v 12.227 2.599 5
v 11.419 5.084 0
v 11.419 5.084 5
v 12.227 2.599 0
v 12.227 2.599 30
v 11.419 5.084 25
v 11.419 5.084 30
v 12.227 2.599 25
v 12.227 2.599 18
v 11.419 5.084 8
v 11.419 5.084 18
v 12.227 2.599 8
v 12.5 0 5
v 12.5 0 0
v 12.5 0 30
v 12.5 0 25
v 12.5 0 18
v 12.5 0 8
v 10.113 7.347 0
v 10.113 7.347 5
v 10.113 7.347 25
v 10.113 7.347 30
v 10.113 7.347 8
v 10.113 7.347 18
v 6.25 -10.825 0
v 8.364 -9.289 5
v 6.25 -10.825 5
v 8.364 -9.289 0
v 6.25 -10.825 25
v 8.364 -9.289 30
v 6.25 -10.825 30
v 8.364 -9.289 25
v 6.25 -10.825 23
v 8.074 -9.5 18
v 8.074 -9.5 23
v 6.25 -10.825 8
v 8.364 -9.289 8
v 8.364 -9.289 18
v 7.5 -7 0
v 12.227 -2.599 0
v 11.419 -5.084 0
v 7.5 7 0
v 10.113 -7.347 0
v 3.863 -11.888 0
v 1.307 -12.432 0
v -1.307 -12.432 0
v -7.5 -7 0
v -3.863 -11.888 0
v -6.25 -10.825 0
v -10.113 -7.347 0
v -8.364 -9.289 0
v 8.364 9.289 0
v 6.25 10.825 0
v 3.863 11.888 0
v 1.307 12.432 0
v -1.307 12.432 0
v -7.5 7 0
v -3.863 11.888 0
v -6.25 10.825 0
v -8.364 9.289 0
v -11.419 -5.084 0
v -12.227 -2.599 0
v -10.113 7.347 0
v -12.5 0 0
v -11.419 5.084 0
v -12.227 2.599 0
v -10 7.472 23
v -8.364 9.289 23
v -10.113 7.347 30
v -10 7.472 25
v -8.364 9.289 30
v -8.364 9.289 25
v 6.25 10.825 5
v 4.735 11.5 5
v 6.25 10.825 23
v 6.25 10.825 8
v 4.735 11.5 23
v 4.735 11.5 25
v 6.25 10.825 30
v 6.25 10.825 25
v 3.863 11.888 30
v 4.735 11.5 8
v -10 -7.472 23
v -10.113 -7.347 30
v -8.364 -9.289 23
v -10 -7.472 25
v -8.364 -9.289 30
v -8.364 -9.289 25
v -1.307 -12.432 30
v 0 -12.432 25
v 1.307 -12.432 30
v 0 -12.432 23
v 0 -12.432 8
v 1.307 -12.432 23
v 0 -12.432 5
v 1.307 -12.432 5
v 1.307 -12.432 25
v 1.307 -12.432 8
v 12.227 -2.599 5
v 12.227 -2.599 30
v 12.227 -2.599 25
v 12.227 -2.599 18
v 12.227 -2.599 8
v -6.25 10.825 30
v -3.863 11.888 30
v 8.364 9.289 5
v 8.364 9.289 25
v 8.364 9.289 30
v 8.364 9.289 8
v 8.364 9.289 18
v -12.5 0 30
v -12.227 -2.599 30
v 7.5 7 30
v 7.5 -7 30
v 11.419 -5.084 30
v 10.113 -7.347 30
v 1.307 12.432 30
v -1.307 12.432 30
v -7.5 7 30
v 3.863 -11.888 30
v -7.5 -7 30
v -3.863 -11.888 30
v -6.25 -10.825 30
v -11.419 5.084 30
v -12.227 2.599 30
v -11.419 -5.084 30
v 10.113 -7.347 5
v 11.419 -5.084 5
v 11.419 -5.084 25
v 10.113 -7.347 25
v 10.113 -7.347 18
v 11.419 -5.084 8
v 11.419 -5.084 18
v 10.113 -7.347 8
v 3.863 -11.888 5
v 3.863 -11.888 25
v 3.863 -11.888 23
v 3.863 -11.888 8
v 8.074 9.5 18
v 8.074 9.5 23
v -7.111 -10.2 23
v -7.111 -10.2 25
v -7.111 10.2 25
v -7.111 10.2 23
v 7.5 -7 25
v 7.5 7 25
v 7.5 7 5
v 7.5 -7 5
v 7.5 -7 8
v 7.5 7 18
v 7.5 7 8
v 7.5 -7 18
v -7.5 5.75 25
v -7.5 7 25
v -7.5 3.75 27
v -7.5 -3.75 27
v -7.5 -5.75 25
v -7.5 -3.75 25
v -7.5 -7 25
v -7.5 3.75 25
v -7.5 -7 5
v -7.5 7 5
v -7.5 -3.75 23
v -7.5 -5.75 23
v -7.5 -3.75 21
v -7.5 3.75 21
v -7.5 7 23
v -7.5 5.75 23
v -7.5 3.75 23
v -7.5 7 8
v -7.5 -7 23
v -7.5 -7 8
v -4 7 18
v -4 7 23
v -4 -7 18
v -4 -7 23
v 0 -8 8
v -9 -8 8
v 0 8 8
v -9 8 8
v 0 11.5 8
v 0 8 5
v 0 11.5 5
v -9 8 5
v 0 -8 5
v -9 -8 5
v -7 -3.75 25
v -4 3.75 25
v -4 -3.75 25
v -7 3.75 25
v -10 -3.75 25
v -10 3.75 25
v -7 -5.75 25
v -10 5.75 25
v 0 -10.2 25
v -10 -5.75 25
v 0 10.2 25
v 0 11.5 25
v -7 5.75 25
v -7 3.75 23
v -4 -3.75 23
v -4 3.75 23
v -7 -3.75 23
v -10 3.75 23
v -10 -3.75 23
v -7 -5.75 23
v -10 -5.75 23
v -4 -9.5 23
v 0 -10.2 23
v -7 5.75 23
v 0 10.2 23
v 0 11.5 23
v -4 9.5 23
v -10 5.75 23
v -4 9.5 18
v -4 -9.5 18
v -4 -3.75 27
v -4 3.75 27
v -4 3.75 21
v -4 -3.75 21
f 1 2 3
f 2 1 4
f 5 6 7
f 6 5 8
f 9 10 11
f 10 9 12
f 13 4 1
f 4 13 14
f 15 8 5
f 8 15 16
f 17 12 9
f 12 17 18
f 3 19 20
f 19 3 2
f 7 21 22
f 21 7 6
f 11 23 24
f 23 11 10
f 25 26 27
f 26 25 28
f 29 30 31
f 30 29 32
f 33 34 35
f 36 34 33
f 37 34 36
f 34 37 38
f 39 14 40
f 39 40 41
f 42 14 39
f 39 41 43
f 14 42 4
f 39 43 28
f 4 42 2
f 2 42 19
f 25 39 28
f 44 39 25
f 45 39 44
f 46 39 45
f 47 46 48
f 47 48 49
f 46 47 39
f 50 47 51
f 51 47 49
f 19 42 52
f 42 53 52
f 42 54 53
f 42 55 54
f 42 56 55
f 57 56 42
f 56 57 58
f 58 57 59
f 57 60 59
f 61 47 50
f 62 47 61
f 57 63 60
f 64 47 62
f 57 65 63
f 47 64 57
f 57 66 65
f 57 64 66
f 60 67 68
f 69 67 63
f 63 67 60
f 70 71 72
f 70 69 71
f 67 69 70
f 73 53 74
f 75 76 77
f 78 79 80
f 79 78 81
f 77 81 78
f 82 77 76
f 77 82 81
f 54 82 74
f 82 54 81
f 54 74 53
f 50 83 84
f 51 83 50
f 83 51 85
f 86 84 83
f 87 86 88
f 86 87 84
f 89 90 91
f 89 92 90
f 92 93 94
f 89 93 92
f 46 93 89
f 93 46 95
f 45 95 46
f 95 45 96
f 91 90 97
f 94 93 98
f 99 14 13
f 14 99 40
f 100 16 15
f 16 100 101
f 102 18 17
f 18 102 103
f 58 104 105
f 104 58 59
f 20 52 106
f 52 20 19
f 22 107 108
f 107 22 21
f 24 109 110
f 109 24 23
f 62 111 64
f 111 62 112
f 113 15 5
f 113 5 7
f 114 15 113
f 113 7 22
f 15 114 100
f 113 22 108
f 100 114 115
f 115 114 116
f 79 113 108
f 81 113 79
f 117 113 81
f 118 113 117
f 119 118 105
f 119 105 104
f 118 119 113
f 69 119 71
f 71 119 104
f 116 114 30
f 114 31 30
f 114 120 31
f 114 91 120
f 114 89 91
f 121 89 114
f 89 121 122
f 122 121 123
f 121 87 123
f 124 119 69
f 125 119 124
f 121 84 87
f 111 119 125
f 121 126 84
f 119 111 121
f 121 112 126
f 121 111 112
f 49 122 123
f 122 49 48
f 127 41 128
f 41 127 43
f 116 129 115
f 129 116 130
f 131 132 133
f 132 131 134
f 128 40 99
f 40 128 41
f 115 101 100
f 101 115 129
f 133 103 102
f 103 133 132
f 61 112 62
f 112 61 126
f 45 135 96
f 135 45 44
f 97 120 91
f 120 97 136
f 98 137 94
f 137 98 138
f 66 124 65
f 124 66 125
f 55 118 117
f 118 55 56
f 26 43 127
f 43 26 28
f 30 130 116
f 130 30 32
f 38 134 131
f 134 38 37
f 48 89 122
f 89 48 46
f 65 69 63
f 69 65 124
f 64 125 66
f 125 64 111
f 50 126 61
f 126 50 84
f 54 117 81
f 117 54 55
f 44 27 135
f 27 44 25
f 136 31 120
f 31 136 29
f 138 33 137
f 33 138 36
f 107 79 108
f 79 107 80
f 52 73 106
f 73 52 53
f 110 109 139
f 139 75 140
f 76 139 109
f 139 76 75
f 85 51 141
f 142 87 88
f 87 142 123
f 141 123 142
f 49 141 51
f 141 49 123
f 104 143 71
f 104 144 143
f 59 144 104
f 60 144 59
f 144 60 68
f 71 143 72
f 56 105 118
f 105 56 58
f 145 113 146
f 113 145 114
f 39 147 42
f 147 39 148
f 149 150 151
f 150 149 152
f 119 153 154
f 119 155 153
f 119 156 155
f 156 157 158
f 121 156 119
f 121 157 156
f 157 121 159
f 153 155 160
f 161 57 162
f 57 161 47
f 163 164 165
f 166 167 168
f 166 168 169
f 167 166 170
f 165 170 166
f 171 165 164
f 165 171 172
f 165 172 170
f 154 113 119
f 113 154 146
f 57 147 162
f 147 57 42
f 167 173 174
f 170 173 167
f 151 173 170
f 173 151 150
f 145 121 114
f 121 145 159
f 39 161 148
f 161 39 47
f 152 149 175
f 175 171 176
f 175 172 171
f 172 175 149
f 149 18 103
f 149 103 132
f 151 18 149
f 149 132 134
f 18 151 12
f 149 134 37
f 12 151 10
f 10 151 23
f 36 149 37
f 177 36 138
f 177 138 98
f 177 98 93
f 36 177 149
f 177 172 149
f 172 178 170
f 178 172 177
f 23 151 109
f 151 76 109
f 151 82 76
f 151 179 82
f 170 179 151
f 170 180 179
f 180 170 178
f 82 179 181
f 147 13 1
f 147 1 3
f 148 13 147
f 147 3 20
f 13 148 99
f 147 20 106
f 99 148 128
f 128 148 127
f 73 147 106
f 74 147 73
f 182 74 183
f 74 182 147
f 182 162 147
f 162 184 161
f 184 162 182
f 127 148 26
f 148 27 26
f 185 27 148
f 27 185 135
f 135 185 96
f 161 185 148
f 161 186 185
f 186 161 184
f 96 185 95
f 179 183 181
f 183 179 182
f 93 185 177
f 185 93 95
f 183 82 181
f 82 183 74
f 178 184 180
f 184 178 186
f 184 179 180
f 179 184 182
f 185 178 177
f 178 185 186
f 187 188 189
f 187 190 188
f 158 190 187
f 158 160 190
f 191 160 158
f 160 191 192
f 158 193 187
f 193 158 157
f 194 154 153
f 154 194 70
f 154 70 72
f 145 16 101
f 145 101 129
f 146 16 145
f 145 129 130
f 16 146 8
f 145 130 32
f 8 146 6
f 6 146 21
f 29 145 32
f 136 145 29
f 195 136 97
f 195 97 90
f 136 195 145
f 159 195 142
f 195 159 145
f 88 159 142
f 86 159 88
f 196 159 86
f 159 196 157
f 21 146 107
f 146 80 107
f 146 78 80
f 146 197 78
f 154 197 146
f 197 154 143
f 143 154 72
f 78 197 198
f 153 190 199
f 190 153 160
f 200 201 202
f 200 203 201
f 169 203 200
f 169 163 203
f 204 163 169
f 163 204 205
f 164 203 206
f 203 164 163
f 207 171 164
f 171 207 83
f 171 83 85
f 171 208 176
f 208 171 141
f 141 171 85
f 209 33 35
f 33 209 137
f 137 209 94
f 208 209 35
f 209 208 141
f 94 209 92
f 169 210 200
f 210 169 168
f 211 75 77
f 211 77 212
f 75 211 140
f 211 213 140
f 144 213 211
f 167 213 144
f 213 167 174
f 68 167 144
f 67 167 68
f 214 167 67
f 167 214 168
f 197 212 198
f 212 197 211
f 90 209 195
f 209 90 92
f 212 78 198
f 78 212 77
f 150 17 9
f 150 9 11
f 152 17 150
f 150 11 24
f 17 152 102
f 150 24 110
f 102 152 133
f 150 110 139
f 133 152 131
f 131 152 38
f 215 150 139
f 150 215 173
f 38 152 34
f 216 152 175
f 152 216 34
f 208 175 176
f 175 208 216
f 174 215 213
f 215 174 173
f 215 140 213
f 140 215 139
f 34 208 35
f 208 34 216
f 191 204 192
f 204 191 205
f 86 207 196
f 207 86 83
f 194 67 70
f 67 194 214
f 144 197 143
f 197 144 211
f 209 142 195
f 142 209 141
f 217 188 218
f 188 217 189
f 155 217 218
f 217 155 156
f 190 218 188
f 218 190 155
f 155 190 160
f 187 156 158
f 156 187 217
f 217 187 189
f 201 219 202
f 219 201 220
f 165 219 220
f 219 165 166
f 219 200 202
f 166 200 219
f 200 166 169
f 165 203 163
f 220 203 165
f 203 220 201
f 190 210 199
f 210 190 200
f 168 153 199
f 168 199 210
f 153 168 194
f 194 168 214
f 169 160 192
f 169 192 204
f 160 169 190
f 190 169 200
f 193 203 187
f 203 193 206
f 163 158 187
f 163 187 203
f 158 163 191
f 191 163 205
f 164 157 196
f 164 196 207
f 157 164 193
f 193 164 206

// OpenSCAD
OUTER_RADIUS = 12.5;
OUTER_LENGTH = 30;

CHASM_WIDTH = 14;
CHASM_HEIGHT = 15;
BUFFER1 = 1;
BUFFER2 = 2;

END_BUFFER = 5;

SLICE_WIDTH = (OUTER_RADIUS * 2 ) + BUFFER2;
SLICE_HEIGHT = OUTER_RADIUS;
SLICE_OFFSET = -(SLICE_WIDTH/2) - BUFFER2;

DIFFUSER_THICKNESS = 3; // 3mm plexi
DIFFUSER_WIDTH = 16;
DIFFUSER_HEIGHT = 15;
DIFFUSER_SINK = 1;
DIFFUSER_LOCATION = END_BUFFER;

LAMP_THICKNESS = 2;
LAMP_SLOT_WIDTH = 20.4;
LAMP_SLOT_HEIGHT = 20;
LAMP_SLOT_HORZ = -LAMP_SLOT_WIDTH/2;
LAMP_SLOT_VERT = -LAMP_SLOT_HEIGHT/2;
LAMP_LOCATION = OUTER_LENGTH - END_BUFFER - LAMP_THICKNESS;

EXTRA_WIDTH = 19;
EXTRA_HEIGHT = 20;
EXTRA_THICKNESS = 6;
EXTRA_VERT = -4;
EXTRA_HORZ = -EXTRA_WIDTH/2;
EXTRA_LOCATION = LAMP_LOCATION - EXTRA_THICKNESS + 1;

difference() {
    // Barrel
    translate([0,0,OUTER_LENGTH/2]) {
        cylinder(h=OUTER_LENGTH, r1 = OUTER_RADIUS, r2 = OUTER_RADIUS, center = true);
    }
    
    // Chasm through it
    translate([ -CHASM_HEIGHT/2, -CHASM_WIDTH/2, -BUFFER1 ]) {
        cube([CHASM_HEIGHT, CHASM_WIDTH, OUTER_LENGTH+BUFFER2]);
    }
    
    // Slice for diffuser
    translate([ 0, SLICE_OFFSET, DIFFUSER_LOCATION]){
        cube([ SLICE_HEIGHT, SLICE_WIDTH, DIFFUSER_THICKNESS]);
    }

    // Diffuser slot
    translate([ -(DIFFUSER_WIDTH/2)-DIFFUSER_SINK, -DIFFUSER_WIDTH/2, DIFFUSER_LOCATION]){
        cube( [ DIFFUSER_HEIGHT, DIFFUSER_WIDTH, DIFFUSER_THICKNESS]);
    }

    // Slice for lamp
    translate([ 0, SLICE_OFFSET, LAMP_LOCATION]){
        cube([ SLICE_HEIGHT, SLICE_WIDTH, LAMP_THICKNESS]);
    }
    
    // Extra space for LED and solder pads
    translate([ EXTRA_VERT, EXTRA_HORZ, EXTRA_LOCATION]){
        cube([ EXTRA_HEIGHT, EXTRA_WIDTH, EXTRA_THICKNESS]);
    }

    // Lamp slot
    translate([ LAMP_SLOT_VERT, LAMP_SLOT_HORZ, LAMP_LOCATION]){
        cube( [ LAMP_SLOT_HEIGHT, LAMP_SLOT_WIDTH, LAMP_THICKNESS]);
    }
}


/// Lamp guides
GUIDE_WIDTH = 7.5;
GUIDE_HEIGHT = 6;
GUIDE_THICKNESS = 2;
GUIDE_VERT = LAMP_SLOT_VERT;
GUIDE_LOC_1 = LAMP_LOCATION + LAMP_THICKNESS;
GUIDE_LOC_2 = LAMP_LOCATION - GUIDE_THICKNESS;

translate([ GUIDE_VERT, -GUIDE_WIDTH/2, GUIDE_LOC_1 ]){
    cube( [ GUIDE_HEIGHT, GUIDE_WIDTH, GUIDE_THICKNESS]);
}
translate([ GUIDE_VERT, -GUIDE_WIDTH/2, GUIDE_LOC_2 ]){
    cube( [ GUIDE_HEIGHT, GUIDE_WIDTH, GUIDE_THICKNESS]);
}

// Lamp bumps
BUMP_WIDTH = 2;
BUMP_HEIGHT = 3;

translate([ LAMP_SLOT_VERT, GUIDE_WIDTH/2, LAMP_LOCATION ]){
    cube( [ BUMP_HEIGHT, BUMP_WIDTH, GUIDE_THICKNESS]);
}
translate([ LAMP_SLOT_VERT, -GUIDE_WIDTH/2-BUMP_WIDTH, LAMP_LOCATION ]){
    cube( [ BUMP_HEIGHT, BUMP_WIDTH, GUIDE_THICKNESS]);
}
